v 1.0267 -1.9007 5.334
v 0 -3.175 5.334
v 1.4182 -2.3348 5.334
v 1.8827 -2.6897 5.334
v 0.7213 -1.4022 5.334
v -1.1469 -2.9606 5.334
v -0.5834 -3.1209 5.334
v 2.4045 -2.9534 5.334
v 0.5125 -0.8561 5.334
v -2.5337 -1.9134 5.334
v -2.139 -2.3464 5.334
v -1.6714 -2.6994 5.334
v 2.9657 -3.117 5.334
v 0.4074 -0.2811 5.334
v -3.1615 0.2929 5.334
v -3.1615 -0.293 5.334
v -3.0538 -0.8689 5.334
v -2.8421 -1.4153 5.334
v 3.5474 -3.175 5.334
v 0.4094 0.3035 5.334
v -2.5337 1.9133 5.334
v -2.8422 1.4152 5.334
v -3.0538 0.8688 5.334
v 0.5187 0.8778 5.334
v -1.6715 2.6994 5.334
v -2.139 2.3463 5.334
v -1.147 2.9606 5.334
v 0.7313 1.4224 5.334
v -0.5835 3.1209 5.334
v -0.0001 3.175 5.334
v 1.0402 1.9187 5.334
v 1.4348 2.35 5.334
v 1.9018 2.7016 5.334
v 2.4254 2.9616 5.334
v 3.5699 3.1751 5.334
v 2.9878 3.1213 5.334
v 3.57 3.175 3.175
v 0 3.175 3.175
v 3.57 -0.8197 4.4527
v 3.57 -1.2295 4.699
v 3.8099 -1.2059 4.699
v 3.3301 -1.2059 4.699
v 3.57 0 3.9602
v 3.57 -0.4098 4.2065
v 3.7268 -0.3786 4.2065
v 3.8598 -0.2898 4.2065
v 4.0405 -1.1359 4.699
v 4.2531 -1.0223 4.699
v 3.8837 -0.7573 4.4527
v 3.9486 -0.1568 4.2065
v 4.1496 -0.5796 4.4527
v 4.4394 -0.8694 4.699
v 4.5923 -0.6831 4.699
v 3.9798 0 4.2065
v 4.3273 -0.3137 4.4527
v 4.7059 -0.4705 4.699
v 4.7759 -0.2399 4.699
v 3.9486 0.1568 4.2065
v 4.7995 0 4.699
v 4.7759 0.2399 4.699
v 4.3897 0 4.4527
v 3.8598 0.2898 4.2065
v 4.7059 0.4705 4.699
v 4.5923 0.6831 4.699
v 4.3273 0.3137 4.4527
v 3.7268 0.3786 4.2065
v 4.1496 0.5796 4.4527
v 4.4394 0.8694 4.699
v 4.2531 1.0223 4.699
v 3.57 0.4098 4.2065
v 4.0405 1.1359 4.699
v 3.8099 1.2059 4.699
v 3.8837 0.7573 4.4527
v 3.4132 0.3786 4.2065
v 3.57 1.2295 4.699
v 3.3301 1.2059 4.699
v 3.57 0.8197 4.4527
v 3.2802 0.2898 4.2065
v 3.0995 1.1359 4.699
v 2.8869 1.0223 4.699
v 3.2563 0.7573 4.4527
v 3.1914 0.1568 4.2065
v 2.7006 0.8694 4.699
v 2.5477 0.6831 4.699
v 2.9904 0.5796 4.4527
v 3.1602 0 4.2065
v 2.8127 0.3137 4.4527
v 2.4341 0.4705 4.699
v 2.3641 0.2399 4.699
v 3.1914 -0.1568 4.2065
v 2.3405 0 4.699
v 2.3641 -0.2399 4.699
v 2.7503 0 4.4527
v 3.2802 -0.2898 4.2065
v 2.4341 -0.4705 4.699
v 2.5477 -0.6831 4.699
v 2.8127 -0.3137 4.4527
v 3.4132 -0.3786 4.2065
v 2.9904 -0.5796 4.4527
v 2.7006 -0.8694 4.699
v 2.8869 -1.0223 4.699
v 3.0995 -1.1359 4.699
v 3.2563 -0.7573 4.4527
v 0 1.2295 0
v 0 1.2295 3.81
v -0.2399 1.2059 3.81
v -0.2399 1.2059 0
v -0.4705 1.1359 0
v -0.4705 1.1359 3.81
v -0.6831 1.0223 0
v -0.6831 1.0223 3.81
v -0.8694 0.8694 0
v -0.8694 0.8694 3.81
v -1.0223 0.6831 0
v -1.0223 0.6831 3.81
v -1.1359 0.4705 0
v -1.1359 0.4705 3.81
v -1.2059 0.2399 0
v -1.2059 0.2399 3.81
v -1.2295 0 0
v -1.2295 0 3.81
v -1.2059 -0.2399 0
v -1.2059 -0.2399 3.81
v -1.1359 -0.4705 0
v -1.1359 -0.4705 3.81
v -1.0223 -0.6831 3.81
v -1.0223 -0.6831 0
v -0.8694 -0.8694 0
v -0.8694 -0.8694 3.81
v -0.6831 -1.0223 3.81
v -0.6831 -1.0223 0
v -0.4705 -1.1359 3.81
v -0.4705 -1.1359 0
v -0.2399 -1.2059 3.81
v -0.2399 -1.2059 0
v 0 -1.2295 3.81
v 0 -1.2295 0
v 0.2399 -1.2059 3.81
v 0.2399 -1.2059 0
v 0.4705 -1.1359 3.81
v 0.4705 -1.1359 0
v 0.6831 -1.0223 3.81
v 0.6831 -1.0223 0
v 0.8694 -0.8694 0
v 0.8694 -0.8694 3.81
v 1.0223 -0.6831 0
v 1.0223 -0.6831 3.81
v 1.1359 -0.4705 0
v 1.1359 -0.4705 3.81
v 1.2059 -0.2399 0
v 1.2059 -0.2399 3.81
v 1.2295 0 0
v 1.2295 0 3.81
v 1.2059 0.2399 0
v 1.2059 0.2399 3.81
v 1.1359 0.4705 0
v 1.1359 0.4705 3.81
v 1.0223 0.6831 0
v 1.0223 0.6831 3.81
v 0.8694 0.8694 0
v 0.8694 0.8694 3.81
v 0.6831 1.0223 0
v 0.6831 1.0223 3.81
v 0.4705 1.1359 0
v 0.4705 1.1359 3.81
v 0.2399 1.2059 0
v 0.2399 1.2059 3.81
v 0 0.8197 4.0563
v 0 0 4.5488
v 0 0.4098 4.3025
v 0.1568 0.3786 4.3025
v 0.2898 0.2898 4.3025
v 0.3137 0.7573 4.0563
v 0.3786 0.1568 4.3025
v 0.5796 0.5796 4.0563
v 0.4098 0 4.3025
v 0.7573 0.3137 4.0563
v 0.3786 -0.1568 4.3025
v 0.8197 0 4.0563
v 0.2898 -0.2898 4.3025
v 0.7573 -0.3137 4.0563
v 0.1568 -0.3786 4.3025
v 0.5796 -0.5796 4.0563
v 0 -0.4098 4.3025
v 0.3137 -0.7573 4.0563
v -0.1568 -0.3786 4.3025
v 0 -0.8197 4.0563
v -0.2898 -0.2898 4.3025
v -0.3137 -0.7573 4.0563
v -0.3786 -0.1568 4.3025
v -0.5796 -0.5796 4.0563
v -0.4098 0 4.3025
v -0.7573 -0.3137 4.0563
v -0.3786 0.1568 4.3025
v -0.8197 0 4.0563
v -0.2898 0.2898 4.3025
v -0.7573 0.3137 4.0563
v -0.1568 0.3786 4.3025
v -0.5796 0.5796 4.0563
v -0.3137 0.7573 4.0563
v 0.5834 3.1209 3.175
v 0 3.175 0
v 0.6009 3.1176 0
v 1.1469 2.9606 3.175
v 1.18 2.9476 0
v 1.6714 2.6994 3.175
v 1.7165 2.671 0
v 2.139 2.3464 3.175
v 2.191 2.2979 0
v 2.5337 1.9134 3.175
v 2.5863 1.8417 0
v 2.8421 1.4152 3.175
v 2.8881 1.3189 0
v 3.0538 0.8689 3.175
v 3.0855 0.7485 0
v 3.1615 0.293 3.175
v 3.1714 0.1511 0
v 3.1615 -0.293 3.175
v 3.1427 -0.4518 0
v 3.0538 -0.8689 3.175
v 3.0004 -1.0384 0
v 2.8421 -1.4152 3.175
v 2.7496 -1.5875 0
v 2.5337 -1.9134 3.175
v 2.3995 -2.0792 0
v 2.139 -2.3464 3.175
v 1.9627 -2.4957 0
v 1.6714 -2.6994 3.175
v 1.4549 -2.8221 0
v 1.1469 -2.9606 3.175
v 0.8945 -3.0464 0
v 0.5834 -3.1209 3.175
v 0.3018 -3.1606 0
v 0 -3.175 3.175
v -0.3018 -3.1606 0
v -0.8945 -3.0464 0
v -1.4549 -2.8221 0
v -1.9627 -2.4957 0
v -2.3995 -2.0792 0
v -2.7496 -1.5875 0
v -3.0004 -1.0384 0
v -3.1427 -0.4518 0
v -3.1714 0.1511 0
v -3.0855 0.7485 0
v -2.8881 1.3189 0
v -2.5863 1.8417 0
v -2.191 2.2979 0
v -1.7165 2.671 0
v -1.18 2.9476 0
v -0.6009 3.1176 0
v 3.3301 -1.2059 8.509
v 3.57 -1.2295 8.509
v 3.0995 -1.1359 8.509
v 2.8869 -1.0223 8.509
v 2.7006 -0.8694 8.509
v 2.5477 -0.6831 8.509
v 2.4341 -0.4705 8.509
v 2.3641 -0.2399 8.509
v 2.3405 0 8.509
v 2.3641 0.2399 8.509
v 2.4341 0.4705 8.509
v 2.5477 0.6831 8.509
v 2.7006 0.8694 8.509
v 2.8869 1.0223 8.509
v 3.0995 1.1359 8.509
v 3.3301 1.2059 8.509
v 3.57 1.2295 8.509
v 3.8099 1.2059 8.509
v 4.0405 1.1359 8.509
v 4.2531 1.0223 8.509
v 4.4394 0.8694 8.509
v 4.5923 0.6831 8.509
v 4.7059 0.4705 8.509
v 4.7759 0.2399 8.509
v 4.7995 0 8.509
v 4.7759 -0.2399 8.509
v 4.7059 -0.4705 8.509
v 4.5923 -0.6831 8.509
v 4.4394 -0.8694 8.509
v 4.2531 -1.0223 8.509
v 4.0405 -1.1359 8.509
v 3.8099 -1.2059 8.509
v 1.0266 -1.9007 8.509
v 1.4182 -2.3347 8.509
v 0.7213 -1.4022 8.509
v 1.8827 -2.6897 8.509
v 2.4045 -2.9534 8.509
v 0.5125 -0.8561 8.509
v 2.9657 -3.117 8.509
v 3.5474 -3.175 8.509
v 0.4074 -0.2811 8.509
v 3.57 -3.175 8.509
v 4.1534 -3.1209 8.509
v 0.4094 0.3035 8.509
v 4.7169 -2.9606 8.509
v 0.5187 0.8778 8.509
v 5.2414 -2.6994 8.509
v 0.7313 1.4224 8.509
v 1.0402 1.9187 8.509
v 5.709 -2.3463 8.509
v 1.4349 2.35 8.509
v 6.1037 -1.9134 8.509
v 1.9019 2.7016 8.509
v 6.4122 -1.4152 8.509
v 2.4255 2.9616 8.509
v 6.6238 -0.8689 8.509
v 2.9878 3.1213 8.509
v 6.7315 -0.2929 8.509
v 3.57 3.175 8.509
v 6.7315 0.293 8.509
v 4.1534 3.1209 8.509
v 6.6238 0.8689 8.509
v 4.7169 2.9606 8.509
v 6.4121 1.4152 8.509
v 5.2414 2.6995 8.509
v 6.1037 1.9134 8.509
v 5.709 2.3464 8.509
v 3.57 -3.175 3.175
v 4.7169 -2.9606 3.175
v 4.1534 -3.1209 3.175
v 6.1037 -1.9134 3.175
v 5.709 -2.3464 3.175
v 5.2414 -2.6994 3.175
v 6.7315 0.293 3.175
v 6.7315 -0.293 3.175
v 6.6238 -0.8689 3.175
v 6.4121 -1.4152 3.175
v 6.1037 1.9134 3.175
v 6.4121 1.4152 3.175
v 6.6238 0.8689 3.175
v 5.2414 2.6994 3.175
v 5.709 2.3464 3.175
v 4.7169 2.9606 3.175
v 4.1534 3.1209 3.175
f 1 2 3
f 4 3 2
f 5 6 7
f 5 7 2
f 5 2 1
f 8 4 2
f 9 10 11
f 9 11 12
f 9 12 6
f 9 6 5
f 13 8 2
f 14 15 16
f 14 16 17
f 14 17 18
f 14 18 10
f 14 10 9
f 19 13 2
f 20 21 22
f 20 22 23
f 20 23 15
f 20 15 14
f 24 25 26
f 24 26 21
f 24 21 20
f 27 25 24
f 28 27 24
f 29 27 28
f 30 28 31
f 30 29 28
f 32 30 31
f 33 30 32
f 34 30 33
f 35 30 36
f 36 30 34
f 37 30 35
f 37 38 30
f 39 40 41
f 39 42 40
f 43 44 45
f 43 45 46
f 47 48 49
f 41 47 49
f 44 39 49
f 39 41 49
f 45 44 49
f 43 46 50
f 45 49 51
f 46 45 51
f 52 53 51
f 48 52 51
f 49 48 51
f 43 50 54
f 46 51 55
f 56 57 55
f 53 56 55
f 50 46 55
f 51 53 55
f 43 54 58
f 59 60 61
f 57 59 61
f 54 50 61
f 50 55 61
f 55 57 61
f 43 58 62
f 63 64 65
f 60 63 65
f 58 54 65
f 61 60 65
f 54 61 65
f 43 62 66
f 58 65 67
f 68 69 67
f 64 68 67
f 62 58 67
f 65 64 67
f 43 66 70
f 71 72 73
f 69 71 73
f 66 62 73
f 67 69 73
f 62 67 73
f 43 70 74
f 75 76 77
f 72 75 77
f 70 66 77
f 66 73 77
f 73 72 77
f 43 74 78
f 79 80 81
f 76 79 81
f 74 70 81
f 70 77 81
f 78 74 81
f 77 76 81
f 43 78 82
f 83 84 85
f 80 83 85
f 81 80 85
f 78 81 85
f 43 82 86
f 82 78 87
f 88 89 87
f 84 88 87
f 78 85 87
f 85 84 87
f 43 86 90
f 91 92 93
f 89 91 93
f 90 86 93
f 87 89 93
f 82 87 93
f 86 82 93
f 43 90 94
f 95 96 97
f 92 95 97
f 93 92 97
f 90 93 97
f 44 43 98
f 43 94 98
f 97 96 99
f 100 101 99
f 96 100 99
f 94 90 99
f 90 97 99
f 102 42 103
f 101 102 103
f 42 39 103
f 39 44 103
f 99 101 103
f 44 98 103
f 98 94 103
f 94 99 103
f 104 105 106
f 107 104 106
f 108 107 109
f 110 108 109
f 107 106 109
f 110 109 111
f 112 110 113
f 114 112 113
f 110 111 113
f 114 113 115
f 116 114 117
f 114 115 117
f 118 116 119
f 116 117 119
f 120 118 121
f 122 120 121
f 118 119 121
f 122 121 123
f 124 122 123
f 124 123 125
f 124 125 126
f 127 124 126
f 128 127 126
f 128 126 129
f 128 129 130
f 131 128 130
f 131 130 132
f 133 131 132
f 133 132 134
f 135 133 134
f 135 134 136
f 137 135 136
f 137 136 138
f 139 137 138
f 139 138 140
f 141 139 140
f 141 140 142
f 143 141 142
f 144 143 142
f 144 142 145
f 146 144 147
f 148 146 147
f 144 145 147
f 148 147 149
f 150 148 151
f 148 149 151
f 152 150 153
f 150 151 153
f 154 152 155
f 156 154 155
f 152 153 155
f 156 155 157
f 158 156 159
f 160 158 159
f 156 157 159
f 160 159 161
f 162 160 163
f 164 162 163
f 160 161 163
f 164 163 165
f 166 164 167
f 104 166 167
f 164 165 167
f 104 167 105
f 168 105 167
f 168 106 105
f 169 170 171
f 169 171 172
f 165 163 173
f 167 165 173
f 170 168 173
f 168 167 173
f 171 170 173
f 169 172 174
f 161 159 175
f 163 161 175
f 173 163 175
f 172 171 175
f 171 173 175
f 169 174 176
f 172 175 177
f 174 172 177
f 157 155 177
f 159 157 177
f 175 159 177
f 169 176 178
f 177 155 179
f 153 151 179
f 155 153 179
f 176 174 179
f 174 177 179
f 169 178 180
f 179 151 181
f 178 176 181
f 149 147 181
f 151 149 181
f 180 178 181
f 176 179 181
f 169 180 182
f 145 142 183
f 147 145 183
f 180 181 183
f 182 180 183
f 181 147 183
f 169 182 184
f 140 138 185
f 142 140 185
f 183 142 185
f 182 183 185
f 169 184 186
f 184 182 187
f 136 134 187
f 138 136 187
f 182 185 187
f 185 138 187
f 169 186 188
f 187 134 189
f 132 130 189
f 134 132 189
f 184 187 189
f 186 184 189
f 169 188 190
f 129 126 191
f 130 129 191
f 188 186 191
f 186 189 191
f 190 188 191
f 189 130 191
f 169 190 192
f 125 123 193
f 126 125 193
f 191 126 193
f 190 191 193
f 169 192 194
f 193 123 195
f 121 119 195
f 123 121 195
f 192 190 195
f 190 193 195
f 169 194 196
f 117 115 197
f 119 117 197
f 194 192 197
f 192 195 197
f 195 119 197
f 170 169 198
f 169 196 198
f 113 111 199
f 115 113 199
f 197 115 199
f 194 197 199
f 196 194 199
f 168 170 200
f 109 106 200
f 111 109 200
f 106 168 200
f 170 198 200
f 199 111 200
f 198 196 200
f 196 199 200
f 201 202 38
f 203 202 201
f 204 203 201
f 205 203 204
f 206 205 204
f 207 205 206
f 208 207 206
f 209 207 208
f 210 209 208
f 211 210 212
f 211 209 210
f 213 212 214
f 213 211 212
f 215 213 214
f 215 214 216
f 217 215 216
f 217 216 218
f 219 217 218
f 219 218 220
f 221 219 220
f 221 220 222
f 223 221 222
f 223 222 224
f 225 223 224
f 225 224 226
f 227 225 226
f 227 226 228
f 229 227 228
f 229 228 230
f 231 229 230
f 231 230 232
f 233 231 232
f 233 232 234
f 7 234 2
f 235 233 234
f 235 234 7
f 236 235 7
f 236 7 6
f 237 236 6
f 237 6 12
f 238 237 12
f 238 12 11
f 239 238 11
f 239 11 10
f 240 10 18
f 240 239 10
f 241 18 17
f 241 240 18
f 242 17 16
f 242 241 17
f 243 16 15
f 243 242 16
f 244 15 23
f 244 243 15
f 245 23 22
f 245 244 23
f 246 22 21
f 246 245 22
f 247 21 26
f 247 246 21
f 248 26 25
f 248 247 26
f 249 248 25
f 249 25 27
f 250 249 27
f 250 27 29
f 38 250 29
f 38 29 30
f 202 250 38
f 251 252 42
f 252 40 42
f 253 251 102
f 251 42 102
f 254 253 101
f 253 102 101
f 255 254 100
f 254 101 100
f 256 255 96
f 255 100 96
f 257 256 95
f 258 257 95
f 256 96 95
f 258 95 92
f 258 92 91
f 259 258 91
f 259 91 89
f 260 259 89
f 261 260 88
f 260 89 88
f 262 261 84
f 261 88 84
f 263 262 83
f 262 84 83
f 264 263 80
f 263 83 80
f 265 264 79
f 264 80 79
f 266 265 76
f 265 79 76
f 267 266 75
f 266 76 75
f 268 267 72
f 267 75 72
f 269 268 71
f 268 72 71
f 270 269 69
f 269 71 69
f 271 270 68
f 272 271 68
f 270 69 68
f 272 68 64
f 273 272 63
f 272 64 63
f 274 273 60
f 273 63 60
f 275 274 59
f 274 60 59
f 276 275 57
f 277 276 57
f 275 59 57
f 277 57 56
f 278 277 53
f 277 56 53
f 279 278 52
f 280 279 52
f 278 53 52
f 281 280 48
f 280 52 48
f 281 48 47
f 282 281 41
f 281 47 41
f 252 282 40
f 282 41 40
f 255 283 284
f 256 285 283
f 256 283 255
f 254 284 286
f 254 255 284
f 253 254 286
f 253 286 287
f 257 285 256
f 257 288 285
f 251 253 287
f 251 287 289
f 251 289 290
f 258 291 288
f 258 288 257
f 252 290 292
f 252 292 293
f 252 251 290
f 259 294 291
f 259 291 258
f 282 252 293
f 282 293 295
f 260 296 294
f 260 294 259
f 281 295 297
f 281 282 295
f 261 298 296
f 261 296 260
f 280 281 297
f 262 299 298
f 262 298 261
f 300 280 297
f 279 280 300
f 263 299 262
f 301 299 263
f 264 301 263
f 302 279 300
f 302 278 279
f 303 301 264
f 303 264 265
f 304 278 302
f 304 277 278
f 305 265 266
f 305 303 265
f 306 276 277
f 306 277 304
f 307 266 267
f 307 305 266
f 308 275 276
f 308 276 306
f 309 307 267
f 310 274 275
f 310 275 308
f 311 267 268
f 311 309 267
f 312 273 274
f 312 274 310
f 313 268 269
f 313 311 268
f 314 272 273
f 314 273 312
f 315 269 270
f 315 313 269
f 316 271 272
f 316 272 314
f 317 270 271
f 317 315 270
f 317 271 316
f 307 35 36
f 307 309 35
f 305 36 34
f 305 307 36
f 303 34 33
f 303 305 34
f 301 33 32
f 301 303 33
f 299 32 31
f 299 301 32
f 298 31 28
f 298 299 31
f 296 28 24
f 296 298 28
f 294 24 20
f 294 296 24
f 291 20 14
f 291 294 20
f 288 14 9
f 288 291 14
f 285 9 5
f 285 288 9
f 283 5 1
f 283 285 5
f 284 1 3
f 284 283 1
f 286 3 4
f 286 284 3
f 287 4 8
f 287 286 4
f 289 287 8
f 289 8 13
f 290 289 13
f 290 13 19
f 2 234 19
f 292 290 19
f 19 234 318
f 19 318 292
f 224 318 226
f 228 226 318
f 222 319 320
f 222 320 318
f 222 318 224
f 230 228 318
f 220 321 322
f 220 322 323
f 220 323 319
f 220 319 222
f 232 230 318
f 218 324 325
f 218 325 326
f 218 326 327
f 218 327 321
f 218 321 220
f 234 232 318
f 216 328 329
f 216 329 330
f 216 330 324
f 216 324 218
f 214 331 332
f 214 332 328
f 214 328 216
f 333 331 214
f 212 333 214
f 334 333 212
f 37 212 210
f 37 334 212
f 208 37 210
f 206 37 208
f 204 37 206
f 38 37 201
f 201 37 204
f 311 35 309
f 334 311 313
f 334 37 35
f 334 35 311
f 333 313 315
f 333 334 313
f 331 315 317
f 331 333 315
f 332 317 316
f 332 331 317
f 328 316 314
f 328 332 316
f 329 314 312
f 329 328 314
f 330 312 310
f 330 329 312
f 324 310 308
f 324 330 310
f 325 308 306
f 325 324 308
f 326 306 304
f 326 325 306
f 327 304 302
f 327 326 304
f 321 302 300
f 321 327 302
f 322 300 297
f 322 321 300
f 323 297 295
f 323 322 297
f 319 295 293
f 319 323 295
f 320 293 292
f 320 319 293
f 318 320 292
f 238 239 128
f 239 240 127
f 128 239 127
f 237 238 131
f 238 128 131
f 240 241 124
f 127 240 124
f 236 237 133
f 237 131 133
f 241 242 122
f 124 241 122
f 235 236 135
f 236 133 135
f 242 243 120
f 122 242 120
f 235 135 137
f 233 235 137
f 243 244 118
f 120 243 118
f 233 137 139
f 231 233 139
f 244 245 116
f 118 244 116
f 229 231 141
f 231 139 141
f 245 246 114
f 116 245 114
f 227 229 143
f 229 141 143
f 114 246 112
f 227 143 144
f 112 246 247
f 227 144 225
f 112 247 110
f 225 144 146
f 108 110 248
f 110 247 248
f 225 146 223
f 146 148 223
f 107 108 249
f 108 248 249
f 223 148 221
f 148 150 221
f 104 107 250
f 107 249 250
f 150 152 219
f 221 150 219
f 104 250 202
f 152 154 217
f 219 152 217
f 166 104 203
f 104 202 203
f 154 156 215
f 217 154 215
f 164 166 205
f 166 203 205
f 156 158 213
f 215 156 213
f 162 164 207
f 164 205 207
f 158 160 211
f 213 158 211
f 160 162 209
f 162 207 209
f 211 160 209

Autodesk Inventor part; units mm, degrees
ref_plane "YZ Plane" through (0, 0, 0) normal (1, 0, 0) x (0, 1, 0)
ref_plane "XZ Plane" through (0, 0, 0) normal (0, 1, 0) x (-1, 0, 0)
ref_plane "XY Plane" through (0, 0, 0) normal (0, 0, 1) x (1, 0, 0)
sketch "Sketch2" plane through (0, 0, 0) normal (0, 0, 1) x (1, 0, 0)
  arc A0 (3.57, -3.175) -> (3.57, 3.175) centre (3.57, 0) ccw
  arc A1 (0, 3.175) -> (0, -3.175) centre (0, 0) ccw
  line L0 (0, 3.175) -> (3.57, 3.175)
  line L1 (0, -3.175) -> (3.57, -3.175)
  dimension "d14" = 6.35
  dimension "d15" = 6.35
  dimension "d16" = 0
  dimension "d17" = 0
  dimension "d18" = 3.57
  dimension "d19" = 0
extrude "Extrusion2" add sketch "Sketch2" along normal blind 8.509
sketch "Sketch3" plane through (0, 0, 8.509) normal (0, 0, 1) x (1, 0, 0)
  point P0 (0, 0)
  point P1 (3.57, 0)
  dimension "d22" = 3.57
  dimension "d23" = 0
hole "Hole1" at (3.57, 0, 8.509) direction (0, 0, -1) diameter 2.459 depth 3.81 tip angle 118 thread size "M3x0.5" class "6H" standard "ISO Metric profile"
sketch "Sketch4" plane through (0, 0, 0) normal (0, 0, -1) x (-1, 0, 0)
  point P0 (0, 0)
hole "Hole2" at (0, 0, 0) direction (0, 0, 1) diameter 2.459 depth 3.81 tip angle 118 thread size "M3x0.5" class "6H" standard "ISO Metric profile"
sketch "Sketch5" plane through (0, 0, 0) normal (0, 0, -1) x (-1, 0, 0)
  arc A0 (-3.57, 3.175) -> (-3.57, -3.175) centre (-3.57, 0) ccw
  arc A1 (0, 3.175) -> (0, -3.175) centre (0, 0) ccw
  line L0 (0, 3.175) -> (-3.57, 3.175)
  arc A2 (0, -3.175) -> (0, 3.175) centre (0, 0) ccw projected
  line L1 (0, -3.175) -> (-3.57, -3.175)
  dimension "d42" = 3.57
extrude "Extrusion3" cut sketch "Sketch5" against normal blind 3.175 from surface at 0 contours L0 A1 L1 A0
sketch "Sketch6" plane through (0, 0, 8.509) normal (0, 0, 1) x (1, 0, 0)
  arc A0 (3.5699, 3.1751) -> (3.5474, -3.175) centre (3.57, 0) ccw
  line L0 (3.5699, 3.1751) -> (-0.0001, 3.175)
  line L1 (0, -3.175) -> (3.57, -3.175) projected
  line L2 (3.5474, -3.175) -> (0, -3.175)
  arc A1 (-0.0001, 3.175) -> (0, -3.175) centre (0, 0) ccw
  dimension "d43" = 3.57
extrude "Extrusion4" cut sketch "Sketch6" against normal blind 3.175
properties part number "PC104_EM-113 standoff_3.57"
